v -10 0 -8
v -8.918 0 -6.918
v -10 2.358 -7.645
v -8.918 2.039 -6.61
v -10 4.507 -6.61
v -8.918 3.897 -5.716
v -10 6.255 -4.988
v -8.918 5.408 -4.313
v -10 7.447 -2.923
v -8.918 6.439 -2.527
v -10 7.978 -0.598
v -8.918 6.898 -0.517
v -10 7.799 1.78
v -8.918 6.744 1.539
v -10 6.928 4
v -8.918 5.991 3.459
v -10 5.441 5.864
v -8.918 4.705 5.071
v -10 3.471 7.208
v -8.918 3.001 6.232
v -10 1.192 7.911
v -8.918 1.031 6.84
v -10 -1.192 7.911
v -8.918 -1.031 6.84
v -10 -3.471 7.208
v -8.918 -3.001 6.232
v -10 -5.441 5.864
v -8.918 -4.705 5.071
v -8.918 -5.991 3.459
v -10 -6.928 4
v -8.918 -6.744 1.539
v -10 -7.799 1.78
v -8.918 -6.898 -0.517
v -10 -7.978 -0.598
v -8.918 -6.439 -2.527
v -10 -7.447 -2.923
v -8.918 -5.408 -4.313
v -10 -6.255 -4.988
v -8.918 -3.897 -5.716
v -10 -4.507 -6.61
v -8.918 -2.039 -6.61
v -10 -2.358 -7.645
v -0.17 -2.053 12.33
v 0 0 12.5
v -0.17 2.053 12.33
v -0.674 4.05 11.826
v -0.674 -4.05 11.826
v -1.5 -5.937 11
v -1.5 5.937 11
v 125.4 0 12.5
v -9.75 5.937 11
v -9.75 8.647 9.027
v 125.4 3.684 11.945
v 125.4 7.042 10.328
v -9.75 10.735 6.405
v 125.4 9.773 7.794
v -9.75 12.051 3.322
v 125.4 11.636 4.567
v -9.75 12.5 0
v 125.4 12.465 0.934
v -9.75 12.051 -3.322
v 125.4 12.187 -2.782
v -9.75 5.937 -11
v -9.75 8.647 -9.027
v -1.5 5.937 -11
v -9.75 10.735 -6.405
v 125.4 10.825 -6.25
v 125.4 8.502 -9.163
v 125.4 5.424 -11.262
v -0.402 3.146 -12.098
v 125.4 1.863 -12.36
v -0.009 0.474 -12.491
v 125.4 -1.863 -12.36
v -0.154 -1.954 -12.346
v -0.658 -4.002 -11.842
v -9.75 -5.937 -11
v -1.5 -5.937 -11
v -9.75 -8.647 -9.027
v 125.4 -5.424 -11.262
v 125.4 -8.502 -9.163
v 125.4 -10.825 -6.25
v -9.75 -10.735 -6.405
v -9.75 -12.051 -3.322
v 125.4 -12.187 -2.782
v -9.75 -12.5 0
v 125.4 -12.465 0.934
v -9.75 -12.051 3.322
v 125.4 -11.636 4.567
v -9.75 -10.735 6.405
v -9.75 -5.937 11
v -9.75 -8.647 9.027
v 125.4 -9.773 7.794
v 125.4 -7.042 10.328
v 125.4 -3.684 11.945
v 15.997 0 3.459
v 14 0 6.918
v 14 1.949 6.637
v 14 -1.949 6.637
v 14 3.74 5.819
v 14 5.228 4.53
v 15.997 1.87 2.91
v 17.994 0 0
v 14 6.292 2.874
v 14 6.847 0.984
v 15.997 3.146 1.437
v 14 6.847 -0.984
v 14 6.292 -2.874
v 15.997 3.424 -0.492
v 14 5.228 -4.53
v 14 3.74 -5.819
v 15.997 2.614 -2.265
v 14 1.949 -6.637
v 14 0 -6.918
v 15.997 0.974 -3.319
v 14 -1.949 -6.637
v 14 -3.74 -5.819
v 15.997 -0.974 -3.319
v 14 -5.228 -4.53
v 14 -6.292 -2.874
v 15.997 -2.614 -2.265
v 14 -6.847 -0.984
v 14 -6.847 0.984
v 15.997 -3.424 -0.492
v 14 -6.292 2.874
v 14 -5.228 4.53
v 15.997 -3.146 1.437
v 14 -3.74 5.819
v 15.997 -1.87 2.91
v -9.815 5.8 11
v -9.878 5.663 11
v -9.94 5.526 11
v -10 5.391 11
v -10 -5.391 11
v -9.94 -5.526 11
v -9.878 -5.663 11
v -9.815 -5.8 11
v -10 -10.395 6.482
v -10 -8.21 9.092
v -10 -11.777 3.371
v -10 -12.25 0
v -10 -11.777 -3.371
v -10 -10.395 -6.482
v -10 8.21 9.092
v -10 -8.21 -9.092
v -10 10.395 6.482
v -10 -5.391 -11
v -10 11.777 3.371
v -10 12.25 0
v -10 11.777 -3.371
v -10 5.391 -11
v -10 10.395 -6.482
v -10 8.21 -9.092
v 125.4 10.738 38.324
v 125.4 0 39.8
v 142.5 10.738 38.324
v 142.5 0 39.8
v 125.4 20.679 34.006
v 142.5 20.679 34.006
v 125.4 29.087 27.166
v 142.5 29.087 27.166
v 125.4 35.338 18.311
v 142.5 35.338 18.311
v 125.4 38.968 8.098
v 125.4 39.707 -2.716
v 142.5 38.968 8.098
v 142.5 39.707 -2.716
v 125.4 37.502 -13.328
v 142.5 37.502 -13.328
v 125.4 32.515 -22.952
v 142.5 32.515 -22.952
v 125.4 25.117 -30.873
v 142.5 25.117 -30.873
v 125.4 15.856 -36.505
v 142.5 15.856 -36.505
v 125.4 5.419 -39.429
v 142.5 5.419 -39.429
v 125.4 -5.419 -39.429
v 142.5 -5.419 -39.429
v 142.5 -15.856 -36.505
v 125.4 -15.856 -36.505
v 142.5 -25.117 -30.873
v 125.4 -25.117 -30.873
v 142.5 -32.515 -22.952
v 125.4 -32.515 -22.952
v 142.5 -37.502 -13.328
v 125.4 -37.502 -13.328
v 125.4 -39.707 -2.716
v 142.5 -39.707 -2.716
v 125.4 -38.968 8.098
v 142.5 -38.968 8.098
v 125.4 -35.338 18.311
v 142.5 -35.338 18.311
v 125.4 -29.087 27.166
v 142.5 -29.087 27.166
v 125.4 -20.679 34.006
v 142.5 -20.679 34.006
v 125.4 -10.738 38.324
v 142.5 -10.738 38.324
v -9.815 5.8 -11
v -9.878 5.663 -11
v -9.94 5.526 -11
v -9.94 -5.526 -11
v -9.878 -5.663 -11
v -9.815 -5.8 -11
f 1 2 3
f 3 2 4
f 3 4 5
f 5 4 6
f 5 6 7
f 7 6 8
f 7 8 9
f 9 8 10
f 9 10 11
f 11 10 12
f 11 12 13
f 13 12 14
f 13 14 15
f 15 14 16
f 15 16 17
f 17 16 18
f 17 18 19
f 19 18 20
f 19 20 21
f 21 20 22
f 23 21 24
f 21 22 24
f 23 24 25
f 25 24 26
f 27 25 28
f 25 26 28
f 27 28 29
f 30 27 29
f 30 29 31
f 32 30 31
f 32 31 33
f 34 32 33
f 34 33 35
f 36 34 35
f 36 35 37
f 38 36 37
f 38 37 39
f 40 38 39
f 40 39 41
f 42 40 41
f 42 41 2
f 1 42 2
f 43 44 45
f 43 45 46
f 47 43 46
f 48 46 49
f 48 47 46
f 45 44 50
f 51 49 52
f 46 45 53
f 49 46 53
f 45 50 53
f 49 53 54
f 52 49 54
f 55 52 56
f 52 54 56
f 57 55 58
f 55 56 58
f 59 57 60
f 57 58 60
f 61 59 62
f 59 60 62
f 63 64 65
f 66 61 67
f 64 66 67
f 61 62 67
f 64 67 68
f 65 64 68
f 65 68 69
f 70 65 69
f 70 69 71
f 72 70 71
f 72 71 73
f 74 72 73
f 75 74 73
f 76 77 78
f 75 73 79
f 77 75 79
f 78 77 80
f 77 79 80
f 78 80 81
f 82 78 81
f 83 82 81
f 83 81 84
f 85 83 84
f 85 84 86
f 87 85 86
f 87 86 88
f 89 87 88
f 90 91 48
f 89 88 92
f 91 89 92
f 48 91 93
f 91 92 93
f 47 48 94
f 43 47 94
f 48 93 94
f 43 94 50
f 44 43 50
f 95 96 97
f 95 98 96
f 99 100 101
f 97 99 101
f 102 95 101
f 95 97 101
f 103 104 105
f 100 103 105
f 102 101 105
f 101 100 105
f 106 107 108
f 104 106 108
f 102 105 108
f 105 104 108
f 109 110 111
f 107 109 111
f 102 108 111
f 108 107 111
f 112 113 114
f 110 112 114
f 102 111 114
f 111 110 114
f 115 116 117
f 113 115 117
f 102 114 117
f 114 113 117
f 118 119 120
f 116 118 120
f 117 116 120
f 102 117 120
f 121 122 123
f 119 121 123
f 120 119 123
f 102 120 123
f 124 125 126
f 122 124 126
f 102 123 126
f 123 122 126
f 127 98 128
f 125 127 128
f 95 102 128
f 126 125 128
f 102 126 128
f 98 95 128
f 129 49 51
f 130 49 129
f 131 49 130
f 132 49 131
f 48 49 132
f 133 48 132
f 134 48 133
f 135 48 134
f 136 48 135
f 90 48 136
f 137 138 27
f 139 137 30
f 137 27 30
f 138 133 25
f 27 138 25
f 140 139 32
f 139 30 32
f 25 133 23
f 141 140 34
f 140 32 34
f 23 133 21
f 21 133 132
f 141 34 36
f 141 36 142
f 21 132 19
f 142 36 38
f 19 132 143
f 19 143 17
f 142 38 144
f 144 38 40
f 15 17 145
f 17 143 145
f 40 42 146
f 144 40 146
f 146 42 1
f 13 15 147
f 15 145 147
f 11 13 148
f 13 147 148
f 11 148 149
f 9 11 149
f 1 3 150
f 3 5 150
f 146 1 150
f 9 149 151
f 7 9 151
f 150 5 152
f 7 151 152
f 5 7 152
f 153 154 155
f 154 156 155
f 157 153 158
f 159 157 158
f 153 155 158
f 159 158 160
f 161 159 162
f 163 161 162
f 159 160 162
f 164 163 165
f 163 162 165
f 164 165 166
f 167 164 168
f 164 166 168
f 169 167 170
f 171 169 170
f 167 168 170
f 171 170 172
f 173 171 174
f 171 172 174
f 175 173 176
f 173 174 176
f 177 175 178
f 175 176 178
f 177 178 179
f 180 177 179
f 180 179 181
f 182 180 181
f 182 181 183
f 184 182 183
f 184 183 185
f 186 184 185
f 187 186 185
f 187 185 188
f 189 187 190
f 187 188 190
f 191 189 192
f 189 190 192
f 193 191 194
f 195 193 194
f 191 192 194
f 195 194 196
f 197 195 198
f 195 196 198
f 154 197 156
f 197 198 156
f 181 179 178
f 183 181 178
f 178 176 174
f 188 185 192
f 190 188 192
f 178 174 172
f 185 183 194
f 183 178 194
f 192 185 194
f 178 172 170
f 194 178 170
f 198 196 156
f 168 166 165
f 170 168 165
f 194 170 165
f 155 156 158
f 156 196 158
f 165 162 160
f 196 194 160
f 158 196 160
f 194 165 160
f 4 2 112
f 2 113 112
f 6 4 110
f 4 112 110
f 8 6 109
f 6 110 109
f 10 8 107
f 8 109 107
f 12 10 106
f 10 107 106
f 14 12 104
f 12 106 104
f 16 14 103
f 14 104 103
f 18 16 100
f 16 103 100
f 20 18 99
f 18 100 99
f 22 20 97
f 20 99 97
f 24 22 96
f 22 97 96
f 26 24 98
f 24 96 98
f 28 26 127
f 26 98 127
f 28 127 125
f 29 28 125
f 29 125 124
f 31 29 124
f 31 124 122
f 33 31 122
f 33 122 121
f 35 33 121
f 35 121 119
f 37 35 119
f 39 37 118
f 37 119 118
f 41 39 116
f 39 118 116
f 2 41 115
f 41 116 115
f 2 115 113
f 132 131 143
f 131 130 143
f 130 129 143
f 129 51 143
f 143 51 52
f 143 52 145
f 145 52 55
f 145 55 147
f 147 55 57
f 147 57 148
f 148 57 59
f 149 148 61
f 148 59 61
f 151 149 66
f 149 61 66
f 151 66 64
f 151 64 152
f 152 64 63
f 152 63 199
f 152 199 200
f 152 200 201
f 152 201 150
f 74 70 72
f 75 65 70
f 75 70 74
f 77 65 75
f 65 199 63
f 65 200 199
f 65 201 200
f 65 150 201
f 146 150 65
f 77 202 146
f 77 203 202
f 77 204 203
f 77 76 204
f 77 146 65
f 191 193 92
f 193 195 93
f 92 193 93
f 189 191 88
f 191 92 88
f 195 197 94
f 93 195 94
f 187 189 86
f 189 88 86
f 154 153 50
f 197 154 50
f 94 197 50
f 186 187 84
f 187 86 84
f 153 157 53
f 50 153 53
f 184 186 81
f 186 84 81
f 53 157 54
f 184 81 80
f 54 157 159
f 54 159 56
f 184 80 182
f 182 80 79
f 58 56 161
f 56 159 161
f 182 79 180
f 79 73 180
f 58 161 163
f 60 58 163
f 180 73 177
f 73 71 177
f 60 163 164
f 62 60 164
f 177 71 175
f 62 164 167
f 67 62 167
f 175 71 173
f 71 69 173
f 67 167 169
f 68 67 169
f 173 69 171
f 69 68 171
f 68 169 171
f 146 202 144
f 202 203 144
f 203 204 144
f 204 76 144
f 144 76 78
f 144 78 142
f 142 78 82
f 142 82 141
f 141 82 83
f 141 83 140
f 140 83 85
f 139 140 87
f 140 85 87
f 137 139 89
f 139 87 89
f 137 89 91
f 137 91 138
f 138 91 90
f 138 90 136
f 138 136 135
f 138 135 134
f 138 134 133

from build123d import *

# Parameters (mm, degrees)
CUT_EXTRUDE_1_DEPTH       = 22
CUT_EXTRUDE_1_DEPTH_BACK  = 22
HOLE_WIZARD_1_D           = 13.835
HOLE_WIZARD_1_DEPTH       = 24
HOLE_WIZARD_1_CSINK_D     = 16
HOLE_WIZARD_1_CSINK_ANGLE = 90
HOLE_WIZARD_1_TIP         = 3.993820487


with BuildPart() as part:
    # 草图1 → 旋转1 (revolve)
    with BuildSketch(Plane.XY):
        Polygon((-10, 0), (-10, 12.25), (-9.75, 12.5), (0, 12.5), (0, 0), align=None)
    revolve(axis=Axis((0, 0, 0), (-1, 0, 0)))

    # 草图2 → 旋转2 (revolve)
    with BuildSketch(Plane.XY):
        Polygon((0, 0), (0, 12.5), (125.4, 12.5), (125.4, 39.8), (142.5, 39.8), (142.5, 0), align=None)
    revolve(axis=Axis((142.5, 0, 0), (-1, 0, 0)))

    # 草图3 → 切除-拉伸1 (cut, two sides: drawn at the far end of the back side and taken through both)
    with BuildSketch(Plane(origin=(0, 0, 0), x_dir=(1, 0, 0), z_dir=(0, 1, 0)).offset(-CUT_EXTRUDE_1_DEPTH_BACK)):
        Polygon((-20, -16), (3.5, -16), (-1.5, -11), (-10, -11), (-10, 11), (-1.5, 11), (3.5, 16), (-20, 16), align=None)
    extrude(amount=CUT_EXTRUDE_1_DEPTH + CUT_EXTRUDE_1_DEPTH_BACK, mode=Mode.SUBTRACT)

    # 孔1
    with Locations(Plane.ZY.offset(10)):
        with Locations((0, 0)):
            CounterSinkHole(HOLE_WIZARD_1_D / 2, HOLE_WIZARD_1_CSINK_D / 2, depth=HOLE_WIZARD_1_DEPTH, counter_sink_angle=HOLE_WIZARD_1_CSINK_ANGLE)
            with Locations((0, 0, -(HOLE_WIZARD_1_DEPTH + HOLE_WIZARD_1_TIP / 2))):  # 120° drill point
                Cone(0, HOLE_WIZARD_1_D / 2, HOLE_WIZARD_1_TIP, mode=Mode.SUBTRACT)


solid = part.part
